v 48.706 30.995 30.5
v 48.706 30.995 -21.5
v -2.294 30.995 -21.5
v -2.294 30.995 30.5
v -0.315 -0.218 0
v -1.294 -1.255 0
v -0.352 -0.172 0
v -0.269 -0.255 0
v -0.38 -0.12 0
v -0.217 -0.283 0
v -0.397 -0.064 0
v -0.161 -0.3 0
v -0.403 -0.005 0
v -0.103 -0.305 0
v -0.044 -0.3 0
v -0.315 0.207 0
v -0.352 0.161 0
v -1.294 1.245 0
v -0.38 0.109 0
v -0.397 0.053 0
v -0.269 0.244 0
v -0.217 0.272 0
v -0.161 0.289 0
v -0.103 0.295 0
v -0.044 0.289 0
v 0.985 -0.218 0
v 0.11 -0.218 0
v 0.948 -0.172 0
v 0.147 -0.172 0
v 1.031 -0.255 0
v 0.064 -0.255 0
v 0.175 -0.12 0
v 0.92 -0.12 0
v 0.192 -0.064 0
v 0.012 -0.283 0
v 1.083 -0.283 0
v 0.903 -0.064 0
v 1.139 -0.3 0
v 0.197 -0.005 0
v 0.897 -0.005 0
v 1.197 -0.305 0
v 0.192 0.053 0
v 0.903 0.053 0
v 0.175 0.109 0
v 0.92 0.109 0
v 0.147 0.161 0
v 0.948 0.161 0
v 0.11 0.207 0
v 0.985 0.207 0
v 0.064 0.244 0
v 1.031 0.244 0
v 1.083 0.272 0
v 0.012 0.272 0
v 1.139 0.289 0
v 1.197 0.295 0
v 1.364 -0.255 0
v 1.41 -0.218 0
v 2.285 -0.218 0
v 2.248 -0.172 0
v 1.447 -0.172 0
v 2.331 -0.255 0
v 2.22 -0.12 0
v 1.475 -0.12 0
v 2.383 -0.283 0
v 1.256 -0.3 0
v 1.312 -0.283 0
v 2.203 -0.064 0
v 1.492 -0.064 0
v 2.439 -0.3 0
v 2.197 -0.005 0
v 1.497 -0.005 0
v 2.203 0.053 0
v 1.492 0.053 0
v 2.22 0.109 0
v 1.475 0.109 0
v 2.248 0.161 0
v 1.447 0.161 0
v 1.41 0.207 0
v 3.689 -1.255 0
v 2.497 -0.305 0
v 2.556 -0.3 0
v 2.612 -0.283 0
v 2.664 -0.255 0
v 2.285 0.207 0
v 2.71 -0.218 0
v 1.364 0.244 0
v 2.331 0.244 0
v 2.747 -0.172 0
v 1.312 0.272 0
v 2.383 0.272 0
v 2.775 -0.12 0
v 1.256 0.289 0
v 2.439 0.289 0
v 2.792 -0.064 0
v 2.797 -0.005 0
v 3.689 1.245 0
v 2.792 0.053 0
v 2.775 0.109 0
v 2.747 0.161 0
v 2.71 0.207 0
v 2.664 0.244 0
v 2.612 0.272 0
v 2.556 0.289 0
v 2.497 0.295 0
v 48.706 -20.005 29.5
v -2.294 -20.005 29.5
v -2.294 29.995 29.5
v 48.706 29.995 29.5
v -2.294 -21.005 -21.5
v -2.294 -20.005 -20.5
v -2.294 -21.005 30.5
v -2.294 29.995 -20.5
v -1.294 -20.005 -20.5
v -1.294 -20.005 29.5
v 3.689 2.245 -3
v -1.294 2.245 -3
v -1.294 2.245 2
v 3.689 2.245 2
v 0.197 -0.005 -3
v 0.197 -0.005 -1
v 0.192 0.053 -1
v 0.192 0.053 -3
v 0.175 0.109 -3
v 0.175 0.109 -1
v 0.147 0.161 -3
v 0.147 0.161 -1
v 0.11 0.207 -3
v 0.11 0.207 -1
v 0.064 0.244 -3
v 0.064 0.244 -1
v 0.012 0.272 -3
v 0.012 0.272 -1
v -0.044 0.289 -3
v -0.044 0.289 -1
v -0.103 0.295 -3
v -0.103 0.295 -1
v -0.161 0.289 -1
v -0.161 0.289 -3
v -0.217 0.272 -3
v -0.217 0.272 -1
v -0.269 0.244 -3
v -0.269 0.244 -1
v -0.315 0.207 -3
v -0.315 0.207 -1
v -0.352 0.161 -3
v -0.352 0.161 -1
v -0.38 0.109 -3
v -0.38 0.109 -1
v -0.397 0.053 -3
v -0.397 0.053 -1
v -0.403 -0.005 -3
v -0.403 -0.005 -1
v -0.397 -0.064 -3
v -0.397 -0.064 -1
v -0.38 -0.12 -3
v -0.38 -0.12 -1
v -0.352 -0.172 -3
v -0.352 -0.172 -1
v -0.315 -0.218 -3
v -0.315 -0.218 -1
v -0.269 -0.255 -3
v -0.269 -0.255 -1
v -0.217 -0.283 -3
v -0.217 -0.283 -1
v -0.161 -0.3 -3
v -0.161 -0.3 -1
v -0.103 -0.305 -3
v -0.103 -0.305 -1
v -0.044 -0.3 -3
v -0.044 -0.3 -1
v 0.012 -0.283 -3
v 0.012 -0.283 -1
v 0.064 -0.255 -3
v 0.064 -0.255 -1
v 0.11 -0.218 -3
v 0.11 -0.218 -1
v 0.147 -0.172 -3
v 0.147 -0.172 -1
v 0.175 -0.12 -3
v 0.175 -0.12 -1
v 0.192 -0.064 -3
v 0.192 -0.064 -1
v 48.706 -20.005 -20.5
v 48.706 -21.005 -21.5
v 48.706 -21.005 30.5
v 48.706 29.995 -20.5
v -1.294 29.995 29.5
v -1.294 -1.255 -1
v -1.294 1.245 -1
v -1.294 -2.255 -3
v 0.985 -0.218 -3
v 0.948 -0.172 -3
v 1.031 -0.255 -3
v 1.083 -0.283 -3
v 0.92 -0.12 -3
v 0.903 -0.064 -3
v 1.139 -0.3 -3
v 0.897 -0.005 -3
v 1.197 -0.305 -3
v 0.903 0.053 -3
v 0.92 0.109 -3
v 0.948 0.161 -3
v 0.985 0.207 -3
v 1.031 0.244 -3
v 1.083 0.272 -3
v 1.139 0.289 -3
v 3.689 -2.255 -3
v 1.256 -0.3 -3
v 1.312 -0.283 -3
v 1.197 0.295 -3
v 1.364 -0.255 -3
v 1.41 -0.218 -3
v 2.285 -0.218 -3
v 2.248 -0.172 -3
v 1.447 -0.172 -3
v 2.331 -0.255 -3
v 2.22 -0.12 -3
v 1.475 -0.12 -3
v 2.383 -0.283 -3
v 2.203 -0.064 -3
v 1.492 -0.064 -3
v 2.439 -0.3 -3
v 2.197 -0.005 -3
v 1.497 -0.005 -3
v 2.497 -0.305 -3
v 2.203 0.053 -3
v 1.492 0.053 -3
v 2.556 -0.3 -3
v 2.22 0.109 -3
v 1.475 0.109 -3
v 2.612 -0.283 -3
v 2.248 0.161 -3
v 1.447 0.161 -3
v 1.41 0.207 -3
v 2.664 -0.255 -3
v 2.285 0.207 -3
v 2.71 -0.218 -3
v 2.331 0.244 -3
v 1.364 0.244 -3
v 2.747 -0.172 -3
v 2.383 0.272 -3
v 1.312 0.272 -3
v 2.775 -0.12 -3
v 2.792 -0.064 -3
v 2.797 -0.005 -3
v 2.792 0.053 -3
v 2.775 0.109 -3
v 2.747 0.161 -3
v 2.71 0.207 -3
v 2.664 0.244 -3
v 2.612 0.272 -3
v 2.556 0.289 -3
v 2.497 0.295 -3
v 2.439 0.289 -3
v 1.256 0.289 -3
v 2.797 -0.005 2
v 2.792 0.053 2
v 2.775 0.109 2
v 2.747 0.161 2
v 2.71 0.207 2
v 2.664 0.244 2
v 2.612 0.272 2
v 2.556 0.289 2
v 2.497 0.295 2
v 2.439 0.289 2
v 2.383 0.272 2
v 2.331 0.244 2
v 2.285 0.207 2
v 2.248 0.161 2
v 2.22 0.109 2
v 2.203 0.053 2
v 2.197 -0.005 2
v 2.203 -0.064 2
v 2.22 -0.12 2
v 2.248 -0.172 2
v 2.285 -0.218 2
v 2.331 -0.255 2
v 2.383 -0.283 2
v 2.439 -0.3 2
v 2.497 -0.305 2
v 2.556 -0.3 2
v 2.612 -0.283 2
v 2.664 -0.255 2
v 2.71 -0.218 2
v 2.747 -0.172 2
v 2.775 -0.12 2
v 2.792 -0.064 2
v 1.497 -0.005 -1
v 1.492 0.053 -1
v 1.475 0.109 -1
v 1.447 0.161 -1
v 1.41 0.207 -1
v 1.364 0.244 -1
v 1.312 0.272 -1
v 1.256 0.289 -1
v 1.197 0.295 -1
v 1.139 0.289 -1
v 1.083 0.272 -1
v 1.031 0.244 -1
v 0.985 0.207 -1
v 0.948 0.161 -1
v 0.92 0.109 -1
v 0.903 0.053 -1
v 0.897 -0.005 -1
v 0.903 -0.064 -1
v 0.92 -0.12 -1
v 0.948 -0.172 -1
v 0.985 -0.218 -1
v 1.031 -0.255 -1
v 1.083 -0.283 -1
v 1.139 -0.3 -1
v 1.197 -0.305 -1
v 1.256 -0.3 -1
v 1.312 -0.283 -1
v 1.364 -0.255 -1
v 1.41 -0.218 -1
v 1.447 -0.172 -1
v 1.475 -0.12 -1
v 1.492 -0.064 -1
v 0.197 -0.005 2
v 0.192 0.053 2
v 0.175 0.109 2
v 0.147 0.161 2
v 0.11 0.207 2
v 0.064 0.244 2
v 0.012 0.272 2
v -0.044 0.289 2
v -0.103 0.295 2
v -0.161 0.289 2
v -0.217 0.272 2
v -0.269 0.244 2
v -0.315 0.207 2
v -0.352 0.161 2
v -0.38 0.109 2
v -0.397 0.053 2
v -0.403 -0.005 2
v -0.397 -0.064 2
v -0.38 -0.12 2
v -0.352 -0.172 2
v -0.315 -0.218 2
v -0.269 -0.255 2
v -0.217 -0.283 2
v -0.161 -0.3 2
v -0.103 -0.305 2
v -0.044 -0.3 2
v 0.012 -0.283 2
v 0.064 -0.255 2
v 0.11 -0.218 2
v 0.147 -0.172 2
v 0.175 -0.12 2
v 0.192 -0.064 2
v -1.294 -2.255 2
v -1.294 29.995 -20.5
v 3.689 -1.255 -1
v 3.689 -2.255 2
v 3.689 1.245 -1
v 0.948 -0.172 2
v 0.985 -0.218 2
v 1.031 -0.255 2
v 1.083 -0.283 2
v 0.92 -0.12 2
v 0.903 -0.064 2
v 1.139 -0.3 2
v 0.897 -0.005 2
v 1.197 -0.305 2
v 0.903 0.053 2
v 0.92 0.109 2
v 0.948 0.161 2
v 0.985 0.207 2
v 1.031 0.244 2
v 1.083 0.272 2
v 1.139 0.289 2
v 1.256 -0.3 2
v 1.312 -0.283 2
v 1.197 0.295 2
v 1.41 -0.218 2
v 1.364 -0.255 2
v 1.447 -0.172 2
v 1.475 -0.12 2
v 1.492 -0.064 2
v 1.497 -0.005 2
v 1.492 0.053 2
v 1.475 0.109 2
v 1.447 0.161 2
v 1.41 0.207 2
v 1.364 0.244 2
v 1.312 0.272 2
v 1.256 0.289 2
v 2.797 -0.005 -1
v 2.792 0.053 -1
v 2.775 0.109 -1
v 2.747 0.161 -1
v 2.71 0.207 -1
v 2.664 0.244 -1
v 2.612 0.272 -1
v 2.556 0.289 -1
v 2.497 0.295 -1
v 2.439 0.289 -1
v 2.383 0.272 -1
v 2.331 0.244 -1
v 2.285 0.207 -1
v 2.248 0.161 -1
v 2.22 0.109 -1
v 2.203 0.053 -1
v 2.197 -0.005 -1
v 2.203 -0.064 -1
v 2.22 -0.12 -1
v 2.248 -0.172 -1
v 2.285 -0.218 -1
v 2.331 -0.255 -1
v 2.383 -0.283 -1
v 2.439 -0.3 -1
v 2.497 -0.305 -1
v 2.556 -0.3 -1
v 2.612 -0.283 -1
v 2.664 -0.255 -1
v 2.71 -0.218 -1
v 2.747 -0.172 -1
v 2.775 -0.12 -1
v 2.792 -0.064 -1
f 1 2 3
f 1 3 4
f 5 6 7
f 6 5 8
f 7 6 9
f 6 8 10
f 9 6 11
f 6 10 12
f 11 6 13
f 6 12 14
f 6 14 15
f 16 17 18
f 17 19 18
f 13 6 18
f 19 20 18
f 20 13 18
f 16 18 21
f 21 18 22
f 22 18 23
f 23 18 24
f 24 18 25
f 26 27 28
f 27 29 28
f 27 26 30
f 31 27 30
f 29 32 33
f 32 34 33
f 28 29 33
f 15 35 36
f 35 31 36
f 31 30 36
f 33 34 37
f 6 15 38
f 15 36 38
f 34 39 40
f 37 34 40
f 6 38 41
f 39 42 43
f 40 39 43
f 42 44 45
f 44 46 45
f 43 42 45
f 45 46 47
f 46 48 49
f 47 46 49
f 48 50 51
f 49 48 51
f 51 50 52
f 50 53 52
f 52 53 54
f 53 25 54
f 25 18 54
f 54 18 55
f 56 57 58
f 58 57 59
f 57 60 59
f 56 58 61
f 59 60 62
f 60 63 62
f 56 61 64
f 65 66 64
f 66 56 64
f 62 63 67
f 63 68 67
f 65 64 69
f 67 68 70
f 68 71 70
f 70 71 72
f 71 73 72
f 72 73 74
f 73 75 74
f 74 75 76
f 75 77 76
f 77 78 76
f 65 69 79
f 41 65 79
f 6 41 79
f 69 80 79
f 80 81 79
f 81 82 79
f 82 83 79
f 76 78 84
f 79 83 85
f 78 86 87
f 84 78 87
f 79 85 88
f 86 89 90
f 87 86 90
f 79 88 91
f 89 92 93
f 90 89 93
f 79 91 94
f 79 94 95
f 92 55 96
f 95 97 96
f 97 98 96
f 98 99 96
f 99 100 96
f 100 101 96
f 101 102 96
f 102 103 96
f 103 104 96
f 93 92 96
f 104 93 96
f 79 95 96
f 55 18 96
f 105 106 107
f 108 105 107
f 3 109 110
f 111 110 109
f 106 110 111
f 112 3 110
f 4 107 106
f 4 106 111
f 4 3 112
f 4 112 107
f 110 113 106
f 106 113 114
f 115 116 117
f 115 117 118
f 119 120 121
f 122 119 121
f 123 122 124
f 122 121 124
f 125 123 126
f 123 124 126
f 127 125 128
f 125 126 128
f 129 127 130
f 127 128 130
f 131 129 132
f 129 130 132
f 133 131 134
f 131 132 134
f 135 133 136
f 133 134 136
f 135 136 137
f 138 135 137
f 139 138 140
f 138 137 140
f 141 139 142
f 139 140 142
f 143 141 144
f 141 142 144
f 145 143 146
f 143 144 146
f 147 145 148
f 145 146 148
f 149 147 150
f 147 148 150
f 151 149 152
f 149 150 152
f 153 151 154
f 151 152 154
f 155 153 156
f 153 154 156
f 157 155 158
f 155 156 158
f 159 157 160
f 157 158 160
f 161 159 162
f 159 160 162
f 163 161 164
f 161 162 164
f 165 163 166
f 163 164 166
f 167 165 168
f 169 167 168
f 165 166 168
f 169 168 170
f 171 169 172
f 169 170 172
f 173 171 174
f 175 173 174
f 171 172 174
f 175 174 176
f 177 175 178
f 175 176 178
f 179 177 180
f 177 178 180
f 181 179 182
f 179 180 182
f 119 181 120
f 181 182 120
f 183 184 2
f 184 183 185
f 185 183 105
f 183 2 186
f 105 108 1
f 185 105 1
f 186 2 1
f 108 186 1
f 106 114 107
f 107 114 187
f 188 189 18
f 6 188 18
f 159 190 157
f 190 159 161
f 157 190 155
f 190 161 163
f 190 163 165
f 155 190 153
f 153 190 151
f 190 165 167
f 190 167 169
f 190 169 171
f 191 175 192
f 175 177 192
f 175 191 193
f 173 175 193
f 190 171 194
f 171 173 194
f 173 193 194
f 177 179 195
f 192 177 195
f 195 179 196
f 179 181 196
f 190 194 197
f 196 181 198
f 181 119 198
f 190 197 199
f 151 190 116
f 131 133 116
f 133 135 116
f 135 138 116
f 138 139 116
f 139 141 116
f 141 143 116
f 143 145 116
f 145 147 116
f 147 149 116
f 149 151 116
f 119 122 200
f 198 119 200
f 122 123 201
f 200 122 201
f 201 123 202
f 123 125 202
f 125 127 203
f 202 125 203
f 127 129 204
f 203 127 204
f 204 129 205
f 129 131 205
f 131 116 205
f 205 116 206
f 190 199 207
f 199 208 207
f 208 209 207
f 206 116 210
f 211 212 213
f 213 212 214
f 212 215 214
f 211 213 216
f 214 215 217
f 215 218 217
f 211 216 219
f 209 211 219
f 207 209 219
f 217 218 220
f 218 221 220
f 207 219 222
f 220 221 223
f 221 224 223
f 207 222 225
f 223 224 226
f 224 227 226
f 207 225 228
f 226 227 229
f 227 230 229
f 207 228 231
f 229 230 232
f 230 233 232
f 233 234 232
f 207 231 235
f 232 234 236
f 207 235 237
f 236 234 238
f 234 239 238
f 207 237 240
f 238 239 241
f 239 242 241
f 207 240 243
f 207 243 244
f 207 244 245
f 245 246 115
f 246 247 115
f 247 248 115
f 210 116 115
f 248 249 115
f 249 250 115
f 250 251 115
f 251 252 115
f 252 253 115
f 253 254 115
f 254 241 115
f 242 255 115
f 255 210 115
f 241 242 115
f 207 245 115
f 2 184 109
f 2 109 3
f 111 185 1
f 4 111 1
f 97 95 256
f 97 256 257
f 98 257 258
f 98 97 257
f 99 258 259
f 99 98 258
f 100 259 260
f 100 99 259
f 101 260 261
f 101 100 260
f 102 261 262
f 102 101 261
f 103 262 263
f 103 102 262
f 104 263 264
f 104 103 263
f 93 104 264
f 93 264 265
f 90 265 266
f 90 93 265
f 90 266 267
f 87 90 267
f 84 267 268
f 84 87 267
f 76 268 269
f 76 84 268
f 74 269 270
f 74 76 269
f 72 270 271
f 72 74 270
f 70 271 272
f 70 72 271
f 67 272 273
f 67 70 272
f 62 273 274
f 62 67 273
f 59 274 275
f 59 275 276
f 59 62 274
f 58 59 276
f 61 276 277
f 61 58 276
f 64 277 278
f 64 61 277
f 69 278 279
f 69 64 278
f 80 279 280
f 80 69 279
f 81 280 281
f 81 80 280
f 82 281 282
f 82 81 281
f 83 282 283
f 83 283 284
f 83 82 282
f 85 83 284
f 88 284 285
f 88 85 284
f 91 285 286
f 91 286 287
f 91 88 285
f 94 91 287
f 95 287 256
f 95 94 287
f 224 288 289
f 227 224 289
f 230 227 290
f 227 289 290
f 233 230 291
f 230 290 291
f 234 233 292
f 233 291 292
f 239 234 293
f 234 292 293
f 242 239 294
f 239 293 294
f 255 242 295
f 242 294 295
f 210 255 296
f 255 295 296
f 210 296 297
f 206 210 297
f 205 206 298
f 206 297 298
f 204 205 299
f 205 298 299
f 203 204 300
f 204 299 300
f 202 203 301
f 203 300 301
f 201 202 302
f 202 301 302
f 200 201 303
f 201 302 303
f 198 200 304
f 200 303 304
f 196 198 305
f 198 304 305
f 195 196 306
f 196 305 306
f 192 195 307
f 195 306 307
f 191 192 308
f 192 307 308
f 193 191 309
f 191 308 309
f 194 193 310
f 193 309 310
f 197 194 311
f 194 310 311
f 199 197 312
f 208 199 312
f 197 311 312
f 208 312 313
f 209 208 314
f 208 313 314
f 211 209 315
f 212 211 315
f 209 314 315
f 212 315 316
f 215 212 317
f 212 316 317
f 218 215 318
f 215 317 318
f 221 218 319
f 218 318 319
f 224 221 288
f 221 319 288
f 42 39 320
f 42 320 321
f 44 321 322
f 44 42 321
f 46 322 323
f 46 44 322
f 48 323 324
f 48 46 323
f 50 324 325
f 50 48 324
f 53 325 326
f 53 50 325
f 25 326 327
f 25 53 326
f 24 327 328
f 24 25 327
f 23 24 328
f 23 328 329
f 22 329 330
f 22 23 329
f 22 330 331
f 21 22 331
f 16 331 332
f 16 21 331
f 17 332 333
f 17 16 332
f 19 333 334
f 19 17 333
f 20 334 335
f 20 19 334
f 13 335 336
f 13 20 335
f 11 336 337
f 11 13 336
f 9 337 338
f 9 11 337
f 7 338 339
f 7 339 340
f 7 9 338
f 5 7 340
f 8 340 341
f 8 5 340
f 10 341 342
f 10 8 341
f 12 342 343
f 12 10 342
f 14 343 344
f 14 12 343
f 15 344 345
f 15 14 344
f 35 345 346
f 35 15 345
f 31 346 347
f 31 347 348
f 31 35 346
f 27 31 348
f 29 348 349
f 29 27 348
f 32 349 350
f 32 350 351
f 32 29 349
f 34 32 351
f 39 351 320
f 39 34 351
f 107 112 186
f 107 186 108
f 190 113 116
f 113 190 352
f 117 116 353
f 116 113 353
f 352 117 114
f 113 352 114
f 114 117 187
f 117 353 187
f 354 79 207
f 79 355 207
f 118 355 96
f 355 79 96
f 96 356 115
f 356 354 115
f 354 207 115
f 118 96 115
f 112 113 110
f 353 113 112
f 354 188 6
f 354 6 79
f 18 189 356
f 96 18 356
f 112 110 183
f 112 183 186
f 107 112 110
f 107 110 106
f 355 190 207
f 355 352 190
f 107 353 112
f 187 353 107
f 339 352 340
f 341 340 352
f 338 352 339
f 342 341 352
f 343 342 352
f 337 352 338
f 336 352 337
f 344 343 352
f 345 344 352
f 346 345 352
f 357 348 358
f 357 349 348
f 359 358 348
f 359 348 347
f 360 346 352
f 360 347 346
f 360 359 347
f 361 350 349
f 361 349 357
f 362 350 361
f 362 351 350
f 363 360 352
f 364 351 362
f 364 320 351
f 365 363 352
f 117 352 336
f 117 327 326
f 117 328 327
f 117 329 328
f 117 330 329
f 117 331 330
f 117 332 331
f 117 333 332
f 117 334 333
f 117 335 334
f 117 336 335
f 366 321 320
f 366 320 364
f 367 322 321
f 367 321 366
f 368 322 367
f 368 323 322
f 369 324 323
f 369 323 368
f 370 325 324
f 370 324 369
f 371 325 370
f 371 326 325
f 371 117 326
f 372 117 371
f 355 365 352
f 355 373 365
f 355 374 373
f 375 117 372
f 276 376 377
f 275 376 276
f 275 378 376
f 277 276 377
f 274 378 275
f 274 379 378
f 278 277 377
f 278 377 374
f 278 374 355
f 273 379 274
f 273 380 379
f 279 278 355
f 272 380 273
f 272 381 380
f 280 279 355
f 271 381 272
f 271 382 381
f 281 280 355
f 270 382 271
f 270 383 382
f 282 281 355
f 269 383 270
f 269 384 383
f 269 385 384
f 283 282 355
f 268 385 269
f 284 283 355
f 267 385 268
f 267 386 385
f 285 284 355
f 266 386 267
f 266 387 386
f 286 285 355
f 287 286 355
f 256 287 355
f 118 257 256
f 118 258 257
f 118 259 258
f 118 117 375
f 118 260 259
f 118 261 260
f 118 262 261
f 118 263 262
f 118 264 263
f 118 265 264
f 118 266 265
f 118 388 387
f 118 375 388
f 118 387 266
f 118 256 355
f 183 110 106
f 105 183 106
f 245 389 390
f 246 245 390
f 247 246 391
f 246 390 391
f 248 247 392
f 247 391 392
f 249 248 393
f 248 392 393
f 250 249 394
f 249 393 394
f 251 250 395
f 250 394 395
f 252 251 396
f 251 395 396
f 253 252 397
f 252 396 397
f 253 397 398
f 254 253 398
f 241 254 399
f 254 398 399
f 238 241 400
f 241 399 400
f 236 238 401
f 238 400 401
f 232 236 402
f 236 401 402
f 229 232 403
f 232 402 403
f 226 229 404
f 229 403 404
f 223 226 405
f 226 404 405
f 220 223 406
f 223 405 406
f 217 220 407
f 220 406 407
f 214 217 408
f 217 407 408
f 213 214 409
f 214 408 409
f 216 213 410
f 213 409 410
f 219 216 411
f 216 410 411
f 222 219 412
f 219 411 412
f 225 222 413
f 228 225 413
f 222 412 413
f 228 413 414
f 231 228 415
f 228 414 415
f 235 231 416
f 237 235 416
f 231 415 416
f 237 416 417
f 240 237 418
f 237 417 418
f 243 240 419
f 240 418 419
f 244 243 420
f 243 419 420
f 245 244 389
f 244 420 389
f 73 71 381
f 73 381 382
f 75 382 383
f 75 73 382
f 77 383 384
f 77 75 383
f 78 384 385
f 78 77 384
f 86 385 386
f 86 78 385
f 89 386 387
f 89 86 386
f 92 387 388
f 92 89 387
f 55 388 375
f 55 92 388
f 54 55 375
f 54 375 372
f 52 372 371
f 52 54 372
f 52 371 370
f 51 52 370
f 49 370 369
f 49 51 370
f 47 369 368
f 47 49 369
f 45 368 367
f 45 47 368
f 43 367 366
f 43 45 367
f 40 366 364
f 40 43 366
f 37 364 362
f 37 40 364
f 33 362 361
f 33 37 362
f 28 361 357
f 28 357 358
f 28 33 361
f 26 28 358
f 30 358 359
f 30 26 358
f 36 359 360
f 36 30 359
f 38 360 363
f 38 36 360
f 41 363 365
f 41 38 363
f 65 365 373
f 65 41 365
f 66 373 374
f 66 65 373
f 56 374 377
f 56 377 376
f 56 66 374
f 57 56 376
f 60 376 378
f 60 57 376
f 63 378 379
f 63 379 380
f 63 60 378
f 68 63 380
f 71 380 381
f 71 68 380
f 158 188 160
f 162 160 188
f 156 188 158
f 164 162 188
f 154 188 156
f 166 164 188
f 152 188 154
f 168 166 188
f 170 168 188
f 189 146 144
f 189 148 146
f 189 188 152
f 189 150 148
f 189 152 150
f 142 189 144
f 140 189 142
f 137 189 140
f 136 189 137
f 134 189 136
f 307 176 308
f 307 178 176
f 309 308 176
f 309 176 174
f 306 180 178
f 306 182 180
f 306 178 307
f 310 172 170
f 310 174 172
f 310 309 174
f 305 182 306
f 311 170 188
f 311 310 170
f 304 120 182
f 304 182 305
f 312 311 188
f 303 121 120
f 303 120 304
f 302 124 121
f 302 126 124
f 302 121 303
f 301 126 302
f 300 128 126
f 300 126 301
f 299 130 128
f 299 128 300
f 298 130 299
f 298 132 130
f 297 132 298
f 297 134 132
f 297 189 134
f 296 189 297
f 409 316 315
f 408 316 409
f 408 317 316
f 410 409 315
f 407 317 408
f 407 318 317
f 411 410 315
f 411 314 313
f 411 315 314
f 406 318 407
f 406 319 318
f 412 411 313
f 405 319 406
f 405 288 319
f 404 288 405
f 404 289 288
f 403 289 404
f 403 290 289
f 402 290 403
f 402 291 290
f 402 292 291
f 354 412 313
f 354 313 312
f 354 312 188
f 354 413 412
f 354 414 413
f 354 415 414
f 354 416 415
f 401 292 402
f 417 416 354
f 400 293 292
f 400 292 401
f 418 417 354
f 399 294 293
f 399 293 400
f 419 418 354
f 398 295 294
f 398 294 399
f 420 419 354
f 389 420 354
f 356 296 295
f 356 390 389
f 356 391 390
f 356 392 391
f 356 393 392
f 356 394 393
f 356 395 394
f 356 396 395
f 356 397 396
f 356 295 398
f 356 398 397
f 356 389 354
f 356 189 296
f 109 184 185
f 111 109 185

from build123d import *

# Parameters (mm, degrees)
SKETCH1_W                = 4.983520766
SKETCH1_H                = 4.5
SKETCH1_R                = 0.3
BOSS_EXTRUDE1_DEPTH      = 2
SKETCH1_4_W              = 4.983520766
SKETCH1_4_H              = 1
BOSS_EXTRUDE4_DEPTH      = 0.5
SKETCH2_W                = 50
SKETCH2_H                = 50
BOSS_EXTRUDE2_DEPTH      = 1
EXTRUDE_THIN1_DEPTH      = 1
EXTRUDE_THIN1_DEPTH_BACK = 50
SKETCH2_2_W              = 52
SKETCH2_2_H              = 52
SKETCH2_2_W_2            = 50
SKETCH2_2_H_2            = 50


with BuildPart() as part:
    # Sketch1 → Boss-Extrude1 (new body)
    with BuildSketch(Plane.XY):
        with Locations((1.197396054, -0.00538707)):
            Rectangle(SKETCH1_W, SKETCH1_H)
        with Locations((2.497396054, -0.00538707)):
            Circle(SKETCH1_R, mode=Mode.SUBTRACT)
        with Locations((-0.102603946, -0.00538707)):
            Circle(SKETCH1_R, mode=Mode.SUBTRACT)
        with Locations((1.197396054, -0.00538707)):
            Circle(SKETCH1_R, mode=Mode.SUBTRACT)
    extrude(amount=BOSS_EXTRUDE1_DEPTH)

    # Sketch1<4> → Boss-Extrude4 (add)
    with BuildSketch(Plane.XY):
        with Locations((1.197396054, -1.75538707)):
            Rectangle(SKETCH1_4_W, SKETCH1_4_H)
        with Locations((1.197396054, 1.74461293)):
            Rectangle(SKETCH1_4_W, SKETCH1_4_H)
    extrude(amount=-BOSS_EXTRUDE4_DEPTH)


with BuildPart() as body_2:
    # Mirror1: mirrored copy
    add(part.part.mirror(Plane(origin=(0, 0, -0.5), x_dir=(1, 0, 0), z_dir=(0, 0, -1))))


with BuildPart() as part_1:
    add(part.part)

    add(body_2.part)  # Boss-Extrude2 merges body 2
    # Sketch2 → Boss-Extrude2 (add)
    with BuildSketch(Plane.ZY.offset(1.294364329)):
        with Locations((4.5, 4.99461293)):
            Rectangle(SKETCH2_W, SKETCH2_H)
    extrude(amount=BOSS_EXTRUDE2_DEPTH)


with BuildPart() as body_2_2:
    # Sketch2<2> → Extrude-Thin1 (new, two sides: drawn at the far end of the back side and taken through both)
    with BuildSketch(Plane.ZY.offset(1.294364329).offset(-EXTRUDE_THIN1_DEPTH_BACK)):
        with Locations((4.5, 4.99461293)):
            Rectangle(SKETCH2_2_W, SKETCH2_2_H)
        with Locations((4.5, 4.99461293)):
            Rectangle(SKETCH2_2_W_2, SKETCH2_2_H_2, mode=Mode.SUBTRACT)
    extrude(amount=EXTRUDE_THIN1_DEPTH + EXTRUDE_THIN1_DEPTH_BACK)


solid = Compound([part_1.part, body_2_2.part])
